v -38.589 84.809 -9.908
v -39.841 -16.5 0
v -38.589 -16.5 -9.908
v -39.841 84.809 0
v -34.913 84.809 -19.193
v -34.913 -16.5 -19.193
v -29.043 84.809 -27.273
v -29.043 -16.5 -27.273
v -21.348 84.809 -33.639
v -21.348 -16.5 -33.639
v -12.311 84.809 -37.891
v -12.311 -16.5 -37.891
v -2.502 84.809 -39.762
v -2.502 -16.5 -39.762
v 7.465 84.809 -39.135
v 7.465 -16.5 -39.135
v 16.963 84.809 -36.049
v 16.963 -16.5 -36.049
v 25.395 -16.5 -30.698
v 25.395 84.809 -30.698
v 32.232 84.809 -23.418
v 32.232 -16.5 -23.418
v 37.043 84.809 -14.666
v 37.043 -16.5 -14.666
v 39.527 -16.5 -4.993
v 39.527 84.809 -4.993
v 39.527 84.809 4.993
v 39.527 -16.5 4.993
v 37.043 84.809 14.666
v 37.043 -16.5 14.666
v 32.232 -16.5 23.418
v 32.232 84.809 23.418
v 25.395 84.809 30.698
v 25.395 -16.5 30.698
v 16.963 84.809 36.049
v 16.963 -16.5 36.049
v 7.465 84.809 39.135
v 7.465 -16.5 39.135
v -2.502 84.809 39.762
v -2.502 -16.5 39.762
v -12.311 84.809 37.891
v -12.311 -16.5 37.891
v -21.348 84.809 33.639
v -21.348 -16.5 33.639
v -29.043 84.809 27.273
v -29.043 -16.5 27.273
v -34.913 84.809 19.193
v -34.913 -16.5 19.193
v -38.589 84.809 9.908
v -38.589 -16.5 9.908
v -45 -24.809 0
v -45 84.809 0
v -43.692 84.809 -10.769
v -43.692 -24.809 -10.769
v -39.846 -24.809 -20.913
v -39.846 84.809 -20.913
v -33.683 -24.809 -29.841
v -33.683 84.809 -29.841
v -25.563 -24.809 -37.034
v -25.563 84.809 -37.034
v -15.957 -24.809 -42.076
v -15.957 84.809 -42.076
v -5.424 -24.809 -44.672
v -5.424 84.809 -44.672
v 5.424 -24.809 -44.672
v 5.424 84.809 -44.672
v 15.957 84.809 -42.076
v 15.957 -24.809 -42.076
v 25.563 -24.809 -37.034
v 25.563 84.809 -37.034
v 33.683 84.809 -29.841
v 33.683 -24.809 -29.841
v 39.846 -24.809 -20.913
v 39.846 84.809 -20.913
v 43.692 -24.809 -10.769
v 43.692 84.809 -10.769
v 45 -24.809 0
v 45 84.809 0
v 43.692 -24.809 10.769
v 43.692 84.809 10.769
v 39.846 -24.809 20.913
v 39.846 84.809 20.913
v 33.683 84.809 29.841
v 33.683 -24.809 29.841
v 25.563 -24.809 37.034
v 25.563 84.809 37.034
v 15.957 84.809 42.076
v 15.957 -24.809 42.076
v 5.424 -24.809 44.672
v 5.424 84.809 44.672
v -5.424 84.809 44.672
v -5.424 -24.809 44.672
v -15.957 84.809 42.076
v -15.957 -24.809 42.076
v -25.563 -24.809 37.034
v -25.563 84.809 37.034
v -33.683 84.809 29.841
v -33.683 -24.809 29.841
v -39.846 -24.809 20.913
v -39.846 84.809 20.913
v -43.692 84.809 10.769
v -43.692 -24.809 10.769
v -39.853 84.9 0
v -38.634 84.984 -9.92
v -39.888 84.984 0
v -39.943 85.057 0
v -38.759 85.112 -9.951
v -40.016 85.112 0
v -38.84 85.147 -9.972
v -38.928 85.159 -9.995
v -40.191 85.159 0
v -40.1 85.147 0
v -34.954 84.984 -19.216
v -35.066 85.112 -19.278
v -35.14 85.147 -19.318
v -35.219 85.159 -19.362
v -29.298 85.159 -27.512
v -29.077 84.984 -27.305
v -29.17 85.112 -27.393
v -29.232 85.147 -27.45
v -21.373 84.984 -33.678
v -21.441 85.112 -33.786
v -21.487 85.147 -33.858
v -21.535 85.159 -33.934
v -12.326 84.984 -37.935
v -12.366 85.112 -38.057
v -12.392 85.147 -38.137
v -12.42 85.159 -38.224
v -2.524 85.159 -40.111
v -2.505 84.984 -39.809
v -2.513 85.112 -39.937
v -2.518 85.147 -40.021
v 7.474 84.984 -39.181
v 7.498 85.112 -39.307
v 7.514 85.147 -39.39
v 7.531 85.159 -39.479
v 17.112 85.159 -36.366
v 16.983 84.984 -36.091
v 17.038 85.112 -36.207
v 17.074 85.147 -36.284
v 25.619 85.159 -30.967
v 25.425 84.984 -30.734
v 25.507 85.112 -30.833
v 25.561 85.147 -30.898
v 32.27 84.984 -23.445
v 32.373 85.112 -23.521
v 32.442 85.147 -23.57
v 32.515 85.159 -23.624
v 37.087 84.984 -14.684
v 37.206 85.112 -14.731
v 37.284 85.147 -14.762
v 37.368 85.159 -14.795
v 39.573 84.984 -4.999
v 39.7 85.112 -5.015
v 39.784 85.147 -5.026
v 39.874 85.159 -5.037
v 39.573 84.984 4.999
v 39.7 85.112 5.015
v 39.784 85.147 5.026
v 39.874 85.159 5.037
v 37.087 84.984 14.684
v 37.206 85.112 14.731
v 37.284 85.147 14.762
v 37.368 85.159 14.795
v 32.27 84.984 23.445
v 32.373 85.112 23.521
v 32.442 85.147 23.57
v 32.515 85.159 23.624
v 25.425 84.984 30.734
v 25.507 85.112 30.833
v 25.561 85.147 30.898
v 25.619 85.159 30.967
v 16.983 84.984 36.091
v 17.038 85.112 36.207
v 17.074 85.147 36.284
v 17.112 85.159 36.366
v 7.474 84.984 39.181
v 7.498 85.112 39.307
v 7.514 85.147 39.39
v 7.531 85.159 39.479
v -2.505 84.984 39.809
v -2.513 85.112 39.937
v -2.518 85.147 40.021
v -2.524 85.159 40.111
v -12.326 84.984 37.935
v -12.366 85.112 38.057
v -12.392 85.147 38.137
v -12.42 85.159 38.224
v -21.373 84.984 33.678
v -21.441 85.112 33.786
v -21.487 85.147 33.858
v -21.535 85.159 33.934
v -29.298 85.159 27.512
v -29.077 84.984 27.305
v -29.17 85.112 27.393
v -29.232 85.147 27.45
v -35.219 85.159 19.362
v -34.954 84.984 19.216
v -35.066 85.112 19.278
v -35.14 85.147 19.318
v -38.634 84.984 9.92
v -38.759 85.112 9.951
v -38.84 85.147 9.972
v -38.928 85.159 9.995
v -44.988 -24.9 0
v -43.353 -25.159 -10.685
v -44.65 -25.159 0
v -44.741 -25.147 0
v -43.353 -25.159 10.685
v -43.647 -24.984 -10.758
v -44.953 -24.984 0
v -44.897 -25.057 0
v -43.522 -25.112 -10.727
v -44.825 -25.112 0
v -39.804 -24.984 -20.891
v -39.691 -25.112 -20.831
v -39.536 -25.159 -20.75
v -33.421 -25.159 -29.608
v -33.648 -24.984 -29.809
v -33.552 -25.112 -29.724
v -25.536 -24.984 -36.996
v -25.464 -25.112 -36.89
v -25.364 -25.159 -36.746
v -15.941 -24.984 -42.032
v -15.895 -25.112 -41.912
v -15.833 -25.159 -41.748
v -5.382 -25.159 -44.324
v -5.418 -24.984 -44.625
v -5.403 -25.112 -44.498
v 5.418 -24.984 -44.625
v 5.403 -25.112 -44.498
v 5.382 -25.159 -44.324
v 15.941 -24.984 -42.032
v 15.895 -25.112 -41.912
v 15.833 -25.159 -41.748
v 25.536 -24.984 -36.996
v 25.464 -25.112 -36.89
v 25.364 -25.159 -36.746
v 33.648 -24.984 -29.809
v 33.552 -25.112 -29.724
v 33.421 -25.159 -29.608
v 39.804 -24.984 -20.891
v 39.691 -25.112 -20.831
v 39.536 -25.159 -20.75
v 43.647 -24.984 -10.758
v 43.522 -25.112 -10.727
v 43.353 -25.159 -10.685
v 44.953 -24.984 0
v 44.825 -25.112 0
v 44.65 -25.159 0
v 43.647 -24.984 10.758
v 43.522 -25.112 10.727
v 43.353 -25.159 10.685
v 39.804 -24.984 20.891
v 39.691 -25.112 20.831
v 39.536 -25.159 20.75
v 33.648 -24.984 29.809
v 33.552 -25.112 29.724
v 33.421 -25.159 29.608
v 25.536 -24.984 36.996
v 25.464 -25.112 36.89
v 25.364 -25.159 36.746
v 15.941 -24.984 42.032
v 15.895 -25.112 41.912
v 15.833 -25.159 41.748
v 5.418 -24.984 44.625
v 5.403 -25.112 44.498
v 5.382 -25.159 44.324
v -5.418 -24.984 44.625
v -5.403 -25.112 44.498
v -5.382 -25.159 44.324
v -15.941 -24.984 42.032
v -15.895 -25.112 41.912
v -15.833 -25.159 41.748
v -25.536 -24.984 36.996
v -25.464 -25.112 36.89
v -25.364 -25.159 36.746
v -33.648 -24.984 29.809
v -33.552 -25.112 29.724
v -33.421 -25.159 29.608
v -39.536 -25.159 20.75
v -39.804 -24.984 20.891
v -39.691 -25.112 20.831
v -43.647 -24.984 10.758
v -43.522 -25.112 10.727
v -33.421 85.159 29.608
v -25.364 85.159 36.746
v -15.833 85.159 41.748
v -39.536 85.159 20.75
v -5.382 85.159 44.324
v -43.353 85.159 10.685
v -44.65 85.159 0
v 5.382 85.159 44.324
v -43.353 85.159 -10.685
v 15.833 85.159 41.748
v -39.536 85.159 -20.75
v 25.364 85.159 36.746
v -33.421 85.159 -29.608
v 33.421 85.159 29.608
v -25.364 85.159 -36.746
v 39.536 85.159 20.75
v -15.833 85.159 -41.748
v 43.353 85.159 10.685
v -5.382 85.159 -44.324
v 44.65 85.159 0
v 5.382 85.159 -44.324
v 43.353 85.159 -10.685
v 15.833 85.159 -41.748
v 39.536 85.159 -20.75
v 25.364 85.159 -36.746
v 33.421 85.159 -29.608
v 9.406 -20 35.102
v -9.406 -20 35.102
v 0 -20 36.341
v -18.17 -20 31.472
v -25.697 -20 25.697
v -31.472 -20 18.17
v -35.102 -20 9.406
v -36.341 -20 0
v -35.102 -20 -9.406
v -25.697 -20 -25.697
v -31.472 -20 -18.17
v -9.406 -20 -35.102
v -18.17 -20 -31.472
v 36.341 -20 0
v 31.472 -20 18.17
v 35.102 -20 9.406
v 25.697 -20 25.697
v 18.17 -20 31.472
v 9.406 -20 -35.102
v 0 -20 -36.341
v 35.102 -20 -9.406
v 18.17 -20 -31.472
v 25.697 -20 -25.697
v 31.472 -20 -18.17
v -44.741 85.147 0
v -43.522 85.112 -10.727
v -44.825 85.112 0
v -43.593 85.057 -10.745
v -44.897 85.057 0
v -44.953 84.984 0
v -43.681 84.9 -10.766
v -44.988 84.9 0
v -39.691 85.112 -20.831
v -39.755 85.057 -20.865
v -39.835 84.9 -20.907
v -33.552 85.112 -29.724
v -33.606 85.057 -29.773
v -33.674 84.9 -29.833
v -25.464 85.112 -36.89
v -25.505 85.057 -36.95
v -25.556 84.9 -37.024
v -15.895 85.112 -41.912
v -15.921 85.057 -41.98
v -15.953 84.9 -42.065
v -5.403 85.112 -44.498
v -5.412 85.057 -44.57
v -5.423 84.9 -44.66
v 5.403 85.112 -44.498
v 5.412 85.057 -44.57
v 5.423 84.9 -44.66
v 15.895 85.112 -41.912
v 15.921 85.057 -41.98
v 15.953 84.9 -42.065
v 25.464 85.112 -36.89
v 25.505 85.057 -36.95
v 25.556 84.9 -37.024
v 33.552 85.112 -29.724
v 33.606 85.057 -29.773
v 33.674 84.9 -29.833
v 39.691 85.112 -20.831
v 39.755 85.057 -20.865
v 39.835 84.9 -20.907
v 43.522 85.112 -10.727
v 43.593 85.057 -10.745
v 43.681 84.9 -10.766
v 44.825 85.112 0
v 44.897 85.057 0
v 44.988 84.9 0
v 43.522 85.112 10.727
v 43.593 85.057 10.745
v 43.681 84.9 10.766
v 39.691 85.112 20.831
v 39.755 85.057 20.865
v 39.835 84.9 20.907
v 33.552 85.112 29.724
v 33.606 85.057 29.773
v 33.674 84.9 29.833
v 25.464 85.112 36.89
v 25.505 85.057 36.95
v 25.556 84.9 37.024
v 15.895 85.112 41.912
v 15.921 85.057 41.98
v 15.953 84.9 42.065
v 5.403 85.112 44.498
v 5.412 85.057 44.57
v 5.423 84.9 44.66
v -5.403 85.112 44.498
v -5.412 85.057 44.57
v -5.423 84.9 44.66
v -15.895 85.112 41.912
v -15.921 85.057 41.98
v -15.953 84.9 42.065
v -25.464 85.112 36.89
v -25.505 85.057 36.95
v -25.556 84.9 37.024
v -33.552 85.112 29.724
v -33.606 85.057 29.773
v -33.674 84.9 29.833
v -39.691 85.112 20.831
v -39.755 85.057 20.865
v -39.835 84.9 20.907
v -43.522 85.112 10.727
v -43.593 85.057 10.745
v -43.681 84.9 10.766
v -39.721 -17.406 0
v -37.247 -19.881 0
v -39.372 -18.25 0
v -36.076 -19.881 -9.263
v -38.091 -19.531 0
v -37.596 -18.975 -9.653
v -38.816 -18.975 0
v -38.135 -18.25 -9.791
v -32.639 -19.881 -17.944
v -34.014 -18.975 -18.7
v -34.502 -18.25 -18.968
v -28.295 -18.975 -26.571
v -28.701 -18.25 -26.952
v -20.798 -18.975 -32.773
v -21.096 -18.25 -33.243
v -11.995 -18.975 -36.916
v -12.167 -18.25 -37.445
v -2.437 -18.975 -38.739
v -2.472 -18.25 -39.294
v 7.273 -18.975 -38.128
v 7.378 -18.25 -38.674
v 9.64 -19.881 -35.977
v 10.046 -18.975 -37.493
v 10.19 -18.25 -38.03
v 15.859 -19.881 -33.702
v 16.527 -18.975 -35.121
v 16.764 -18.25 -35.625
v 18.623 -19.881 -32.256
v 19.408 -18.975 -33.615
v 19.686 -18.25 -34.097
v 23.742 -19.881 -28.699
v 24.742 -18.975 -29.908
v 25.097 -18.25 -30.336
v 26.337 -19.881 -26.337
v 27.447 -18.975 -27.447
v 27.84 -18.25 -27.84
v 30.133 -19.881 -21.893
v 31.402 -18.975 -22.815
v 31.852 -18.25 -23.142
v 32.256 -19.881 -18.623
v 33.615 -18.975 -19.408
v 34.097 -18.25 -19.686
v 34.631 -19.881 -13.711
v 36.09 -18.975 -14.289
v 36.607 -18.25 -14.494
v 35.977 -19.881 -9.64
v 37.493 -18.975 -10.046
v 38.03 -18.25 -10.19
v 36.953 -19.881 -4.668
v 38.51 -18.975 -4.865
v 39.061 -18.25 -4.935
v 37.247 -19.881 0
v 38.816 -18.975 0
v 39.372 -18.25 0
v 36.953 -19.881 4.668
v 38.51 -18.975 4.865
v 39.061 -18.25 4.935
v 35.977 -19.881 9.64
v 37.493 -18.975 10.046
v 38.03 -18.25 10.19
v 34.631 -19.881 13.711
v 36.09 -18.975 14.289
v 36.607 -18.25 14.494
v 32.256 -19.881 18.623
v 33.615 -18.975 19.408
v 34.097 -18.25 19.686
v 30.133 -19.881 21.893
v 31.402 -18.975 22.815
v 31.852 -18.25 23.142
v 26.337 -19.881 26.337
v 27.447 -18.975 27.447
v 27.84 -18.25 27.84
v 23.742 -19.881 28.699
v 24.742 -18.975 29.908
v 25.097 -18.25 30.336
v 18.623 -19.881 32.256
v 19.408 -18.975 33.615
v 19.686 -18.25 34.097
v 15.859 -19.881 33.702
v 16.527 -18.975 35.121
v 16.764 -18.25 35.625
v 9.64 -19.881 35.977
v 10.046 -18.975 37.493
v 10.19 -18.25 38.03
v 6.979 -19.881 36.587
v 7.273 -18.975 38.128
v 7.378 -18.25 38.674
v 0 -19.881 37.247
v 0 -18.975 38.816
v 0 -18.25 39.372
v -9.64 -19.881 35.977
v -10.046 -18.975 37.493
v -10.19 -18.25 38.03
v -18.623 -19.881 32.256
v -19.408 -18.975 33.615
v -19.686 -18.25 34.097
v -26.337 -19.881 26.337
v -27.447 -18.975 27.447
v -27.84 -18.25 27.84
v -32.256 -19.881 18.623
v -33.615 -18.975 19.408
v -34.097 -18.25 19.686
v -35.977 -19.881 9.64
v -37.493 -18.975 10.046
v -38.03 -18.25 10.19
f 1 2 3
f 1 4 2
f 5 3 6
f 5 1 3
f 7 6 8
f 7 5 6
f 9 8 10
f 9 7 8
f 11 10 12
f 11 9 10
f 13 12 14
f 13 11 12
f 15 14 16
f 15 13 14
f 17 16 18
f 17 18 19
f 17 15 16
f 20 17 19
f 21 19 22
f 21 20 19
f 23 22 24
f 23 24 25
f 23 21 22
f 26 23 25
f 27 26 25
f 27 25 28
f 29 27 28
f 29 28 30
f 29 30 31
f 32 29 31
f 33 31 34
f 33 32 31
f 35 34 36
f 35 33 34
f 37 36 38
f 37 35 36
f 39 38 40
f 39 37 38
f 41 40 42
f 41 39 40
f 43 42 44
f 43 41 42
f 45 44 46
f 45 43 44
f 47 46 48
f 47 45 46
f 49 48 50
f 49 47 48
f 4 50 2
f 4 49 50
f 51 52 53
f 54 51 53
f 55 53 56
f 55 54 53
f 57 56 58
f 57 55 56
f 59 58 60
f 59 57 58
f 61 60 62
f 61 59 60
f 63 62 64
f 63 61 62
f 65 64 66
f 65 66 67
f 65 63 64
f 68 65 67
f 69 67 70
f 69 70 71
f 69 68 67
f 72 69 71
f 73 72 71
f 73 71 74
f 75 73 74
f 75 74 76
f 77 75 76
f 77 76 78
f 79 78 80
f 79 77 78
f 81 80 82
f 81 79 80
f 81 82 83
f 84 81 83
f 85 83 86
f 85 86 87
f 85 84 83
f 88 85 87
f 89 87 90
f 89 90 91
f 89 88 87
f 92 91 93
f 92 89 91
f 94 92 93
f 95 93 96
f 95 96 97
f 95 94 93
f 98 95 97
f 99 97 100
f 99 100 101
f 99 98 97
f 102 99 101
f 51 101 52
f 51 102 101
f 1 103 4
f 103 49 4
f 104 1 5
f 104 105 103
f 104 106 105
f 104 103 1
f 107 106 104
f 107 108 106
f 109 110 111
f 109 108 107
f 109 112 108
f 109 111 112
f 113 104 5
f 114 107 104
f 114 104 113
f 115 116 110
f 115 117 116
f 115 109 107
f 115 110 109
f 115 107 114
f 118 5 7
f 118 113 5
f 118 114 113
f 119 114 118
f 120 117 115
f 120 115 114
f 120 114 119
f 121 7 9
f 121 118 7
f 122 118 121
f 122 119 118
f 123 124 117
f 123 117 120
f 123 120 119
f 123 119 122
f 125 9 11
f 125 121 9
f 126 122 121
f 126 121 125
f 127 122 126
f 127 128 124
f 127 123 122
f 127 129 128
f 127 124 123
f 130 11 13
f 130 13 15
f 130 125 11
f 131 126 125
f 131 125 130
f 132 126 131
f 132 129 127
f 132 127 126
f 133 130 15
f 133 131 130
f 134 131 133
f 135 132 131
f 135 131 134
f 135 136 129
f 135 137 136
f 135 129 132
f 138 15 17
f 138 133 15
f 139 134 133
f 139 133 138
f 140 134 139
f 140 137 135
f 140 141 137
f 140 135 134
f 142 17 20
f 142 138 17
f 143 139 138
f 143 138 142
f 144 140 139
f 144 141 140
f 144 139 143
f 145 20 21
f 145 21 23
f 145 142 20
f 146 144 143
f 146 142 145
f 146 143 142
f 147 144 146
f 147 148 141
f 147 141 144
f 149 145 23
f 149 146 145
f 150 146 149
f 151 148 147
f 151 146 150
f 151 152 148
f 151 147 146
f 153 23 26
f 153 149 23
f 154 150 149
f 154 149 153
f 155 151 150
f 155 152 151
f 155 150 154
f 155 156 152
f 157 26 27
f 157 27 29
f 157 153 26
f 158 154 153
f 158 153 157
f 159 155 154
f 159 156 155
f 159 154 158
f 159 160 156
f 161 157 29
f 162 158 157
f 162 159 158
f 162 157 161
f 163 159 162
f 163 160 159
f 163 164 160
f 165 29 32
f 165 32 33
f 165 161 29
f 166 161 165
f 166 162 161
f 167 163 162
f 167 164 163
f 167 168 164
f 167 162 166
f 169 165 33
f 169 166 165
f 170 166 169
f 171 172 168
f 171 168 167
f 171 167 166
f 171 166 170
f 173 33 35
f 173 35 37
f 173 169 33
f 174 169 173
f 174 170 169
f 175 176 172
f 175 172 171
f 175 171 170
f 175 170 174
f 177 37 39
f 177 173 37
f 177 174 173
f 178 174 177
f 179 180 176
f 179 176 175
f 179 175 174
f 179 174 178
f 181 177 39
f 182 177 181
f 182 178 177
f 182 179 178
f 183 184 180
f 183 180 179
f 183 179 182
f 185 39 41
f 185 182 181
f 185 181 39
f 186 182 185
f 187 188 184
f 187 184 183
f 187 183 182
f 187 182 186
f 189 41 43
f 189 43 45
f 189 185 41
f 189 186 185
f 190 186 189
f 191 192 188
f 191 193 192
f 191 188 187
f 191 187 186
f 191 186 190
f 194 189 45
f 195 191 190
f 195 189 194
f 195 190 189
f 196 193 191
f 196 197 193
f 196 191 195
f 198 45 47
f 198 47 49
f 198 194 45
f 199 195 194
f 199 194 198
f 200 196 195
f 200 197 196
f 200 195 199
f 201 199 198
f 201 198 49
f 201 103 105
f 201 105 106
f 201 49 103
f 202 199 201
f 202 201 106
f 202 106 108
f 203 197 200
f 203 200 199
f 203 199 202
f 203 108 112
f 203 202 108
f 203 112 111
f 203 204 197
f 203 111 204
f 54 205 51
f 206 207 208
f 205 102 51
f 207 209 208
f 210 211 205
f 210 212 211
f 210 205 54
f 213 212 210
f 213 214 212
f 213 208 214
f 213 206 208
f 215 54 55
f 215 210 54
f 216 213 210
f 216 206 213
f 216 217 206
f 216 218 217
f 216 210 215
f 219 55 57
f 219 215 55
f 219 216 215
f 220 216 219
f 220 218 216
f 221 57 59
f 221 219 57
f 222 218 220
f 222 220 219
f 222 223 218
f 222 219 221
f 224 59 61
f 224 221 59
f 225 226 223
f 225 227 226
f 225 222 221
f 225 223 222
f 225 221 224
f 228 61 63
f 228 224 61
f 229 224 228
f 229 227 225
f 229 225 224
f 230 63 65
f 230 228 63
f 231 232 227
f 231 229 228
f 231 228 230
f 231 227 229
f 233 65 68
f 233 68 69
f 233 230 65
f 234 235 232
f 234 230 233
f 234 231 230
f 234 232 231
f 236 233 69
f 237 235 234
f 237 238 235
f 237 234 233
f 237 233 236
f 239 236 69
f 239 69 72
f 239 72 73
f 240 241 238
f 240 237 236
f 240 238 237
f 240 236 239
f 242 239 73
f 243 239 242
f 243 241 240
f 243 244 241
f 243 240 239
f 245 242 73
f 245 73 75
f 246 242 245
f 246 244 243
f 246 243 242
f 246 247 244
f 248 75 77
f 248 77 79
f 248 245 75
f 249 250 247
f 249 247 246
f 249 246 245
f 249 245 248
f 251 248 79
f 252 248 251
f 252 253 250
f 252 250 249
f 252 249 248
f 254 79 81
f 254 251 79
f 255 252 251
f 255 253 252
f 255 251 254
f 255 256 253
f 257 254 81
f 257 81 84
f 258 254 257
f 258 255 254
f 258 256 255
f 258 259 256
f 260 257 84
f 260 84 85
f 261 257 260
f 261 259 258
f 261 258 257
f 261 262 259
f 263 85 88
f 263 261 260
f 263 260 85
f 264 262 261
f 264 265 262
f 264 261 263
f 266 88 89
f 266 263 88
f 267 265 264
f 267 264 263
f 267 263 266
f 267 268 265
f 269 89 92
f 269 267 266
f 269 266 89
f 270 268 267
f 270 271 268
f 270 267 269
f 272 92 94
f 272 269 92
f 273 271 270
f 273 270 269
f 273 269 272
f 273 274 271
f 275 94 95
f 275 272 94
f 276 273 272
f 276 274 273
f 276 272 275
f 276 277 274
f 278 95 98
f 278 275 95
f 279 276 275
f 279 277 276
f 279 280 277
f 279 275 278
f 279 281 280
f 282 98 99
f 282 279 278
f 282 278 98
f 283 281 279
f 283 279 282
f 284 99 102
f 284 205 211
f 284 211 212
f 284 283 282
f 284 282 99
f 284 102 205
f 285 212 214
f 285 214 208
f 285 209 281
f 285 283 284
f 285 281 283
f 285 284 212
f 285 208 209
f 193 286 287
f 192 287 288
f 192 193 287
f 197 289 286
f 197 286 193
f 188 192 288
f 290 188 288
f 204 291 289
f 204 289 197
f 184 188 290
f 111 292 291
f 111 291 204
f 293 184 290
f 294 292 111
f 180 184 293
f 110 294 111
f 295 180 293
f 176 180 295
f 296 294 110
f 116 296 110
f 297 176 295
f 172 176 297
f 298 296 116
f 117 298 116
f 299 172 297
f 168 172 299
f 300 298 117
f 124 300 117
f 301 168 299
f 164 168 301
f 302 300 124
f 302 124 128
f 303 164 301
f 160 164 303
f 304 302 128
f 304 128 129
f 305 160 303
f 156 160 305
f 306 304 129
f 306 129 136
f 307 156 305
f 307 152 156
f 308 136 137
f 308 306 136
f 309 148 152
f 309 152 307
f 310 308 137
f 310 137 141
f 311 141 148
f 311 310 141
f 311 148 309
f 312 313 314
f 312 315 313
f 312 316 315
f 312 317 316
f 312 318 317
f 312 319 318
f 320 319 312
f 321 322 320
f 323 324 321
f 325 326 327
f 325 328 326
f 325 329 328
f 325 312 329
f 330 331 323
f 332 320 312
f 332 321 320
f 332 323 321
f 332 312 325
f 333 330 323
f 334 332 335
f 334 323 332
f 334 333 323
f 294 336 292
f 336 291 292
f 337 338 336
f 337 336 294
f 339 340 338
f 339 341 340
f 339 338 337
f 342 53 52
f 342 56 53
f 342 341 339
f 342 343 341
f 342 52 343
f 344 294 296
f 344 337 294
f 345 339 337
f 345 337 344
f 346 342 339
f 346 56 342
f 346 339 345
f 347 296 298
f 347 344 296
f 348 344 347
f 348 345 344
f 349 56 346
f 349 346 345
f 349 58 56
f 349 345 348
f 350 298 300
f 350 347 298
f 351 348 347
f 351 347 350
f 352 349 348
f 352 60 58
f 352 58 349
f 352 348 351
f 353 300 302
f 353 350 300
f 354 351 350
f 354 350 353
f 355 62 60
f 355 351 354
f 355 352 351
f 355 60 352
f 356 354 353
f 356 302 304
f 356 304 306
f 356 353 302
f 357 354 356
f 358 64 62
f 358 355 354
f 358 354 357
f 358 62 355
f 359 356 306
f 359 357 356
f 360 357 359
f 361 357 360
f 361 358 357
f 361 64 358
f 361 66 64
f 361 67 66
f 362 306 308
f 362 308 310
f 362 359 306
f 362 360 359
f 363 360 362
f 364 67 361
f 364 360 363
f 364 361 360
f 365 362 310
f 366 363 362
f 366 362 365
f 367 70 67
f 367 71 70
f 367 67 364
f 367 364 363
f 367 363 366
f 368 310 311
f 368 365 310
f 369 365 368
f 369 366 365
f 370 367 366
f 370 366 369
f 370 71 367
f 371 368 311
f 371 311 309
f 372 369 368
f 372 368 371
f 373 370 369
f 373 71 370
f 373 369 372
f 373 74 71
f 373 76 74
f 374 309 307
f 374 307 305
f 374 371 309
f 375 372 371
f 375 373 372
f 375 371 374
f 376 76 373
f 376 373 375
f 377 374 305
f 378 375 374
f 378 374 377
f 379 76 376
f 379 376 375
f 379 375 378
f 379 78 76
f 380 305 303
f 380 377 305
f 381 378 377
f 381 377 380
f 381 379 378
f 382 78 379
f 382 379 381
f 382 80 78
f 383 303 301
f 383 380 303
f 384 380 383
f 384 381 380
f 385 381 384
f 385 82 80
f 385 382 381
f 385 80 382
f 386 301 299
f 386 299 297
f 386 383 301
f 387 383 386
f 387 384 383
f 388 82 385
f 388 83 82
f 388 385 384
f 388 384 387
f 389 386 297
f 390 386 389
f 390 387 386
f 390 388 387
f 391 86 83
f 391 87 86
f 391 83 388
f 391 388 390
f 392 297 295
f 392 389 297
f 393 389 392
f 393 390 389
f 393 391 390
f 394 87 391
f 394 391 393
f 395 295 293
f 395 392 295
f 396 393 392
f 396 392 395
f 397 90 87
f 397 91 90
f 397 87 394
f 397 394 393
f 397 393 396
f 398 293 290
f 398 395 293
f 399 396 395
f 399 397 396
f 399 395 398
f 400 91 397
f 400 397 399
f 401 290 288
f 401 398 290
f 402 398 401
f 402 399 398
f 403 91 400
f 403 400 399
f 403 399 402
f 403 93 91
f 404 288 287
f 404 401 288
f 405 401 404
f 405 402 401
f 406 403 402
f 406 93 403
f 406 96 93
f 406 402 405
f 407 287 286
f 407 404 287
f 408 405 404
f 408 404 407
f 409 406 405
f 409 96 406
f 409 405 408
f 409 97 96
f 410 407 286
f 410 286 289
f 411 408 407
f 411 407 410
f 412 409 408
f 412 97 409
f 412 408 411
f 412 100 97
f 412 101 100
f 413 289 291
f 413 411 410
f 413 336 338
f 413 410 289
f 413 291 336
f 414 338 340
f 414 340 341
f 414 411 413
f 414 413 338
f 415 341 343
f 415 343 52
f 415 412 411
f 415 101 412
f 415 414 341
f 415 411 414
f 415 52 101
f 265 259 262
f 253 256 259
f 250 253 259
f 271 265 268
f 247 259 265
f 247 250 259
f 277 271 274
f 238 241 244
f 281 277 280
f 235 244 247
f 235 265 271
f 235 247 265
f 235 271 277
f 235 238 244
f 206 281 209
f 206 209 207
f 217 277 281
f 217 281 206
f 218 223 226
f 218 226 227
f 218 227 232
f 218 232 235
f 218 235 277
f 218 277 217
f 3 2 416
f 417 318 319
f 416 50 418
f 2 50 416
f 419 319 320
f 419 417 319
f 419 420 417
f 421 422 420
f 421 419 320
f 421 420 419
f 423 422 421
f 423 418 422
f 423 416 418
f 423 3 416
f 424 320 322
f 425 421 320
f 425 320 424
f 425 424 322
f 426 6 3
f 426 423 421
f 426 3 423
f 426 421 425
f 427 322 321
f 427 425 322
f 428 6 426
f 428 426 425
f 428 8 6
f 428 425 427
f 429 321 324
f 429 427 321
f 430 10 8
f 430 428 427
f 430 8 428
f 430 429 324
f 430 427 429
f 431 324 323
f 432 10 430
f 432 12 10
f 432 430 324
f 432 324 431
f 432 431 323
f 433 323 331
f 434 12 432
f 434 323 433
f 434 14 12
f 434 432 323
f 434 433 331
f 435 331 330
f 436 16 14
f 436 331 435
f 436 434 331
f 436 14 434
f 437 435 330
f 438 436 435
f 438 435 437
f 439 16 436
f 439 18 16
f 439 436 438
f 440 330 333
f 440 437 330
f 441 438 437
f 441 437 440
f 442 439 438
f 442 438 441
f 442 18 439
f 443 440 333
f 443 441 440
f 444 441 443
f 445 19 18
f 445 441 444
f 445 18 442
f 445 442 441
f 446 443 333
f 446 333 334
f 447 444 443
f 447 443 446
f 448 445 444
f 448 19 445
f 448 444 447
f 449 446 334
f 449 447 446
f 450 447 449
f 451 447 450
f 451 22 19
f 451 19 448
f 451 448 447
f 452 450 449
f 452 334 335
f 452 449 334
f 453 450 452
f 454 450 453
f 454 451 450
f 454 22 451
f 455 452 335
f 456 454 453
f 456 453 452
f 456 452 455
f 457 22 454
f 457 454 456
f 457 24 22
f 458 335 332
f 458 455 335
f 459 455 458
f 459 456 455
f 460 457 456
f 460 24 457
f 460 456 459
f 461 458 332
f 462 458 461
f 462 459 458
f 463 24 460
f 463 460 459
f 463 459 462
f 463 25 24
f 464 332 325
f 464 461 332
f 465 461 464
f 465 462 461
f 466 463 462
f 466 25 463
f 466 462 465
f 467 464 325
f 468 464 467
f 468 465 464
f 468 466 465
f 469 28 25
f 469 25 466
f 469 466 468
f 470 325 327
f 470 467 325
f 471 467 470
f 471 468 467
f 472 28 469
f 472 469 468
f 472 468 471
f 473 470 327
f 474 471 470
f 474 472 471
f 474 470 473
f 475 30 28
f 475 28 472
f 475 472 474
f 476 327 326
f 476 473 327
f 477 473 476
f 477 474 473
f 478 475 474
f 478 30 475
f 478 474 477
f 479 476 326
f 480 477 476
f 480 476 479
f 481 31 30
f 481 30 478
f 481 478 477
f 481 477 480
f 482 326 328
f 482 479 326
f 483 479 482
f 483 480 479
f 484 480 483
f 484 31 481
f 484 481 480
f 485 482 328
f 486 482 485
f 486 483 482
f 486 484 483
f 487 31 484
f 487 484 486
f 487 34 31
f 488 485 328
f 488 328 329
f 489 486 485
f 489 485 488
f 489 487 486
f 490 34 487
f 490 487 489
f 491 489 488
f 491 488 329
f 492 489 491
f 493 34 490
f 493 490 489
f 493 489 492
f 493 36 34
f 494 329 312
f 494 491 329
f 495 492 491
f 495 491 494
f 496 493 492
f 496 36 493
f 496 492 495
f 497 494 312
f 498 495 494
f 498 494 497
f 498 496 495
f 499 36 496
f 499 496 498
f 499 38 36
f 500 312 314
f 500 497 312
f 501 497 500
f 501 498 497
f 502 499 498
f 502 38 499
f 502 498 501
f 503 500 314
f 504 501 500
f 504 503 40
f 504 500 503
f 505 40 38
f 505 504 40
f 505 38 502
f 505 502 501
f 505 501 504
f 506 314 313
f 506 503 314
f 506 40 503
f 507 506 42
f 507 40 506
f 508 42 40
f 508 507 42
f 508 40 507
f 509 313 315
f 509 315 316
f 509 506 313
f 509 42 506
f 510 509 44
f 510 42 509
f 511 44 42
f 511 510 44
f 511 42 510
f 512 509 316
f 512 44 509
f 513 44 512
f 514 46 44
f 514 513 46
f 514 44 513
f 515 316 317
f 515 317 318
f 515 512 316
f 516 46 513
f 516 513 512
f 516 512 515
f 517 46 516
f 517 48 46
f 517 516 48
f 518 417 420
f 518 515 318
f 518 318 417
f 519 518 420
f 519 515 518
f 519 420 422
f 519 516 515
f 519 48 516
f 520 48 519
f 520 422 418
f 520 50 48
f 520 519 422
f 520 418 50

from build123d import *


with BuildPart() as f1:
    # F0 (on Top) → F1 (revolve)
    with BuildSketch(Plane.XY):
        with BuildLine():
            Line((0, -25.1593), (0, -20))
            Line((0, -20), (-36.3407, -20))
            ThreePointArc((-36.3407, -20), (-38.815574, -18.974874), (-39.8407, -16.5))
            Line((-39.8407, -16.5), (-39.8407, 84.8093))
            ThreePointArc((-39.8407, 84.8093), (-39.943213, 85.056787), (-40.1907, 85.1593))
            Line((-40.1907, 85.1593), (-44.65, 85.1593))
            ThreePointArc((-44.65, 85.1593), (-44.897487, 85.056787), (-45, 84.8093))
            Line((-45, 84.8093), (-45, -24.8093))
            ThreePointArc((-45, -24.8093), (-44.897487, -25.056787), (-44.65, -25.1593))
            Line((-44.65, -25.1593), (0, -25.1593))
        make_face()
    revolve(axis=Axis((0, -25.1593, 0), (0, -1, 0)))


solid = f1.part
